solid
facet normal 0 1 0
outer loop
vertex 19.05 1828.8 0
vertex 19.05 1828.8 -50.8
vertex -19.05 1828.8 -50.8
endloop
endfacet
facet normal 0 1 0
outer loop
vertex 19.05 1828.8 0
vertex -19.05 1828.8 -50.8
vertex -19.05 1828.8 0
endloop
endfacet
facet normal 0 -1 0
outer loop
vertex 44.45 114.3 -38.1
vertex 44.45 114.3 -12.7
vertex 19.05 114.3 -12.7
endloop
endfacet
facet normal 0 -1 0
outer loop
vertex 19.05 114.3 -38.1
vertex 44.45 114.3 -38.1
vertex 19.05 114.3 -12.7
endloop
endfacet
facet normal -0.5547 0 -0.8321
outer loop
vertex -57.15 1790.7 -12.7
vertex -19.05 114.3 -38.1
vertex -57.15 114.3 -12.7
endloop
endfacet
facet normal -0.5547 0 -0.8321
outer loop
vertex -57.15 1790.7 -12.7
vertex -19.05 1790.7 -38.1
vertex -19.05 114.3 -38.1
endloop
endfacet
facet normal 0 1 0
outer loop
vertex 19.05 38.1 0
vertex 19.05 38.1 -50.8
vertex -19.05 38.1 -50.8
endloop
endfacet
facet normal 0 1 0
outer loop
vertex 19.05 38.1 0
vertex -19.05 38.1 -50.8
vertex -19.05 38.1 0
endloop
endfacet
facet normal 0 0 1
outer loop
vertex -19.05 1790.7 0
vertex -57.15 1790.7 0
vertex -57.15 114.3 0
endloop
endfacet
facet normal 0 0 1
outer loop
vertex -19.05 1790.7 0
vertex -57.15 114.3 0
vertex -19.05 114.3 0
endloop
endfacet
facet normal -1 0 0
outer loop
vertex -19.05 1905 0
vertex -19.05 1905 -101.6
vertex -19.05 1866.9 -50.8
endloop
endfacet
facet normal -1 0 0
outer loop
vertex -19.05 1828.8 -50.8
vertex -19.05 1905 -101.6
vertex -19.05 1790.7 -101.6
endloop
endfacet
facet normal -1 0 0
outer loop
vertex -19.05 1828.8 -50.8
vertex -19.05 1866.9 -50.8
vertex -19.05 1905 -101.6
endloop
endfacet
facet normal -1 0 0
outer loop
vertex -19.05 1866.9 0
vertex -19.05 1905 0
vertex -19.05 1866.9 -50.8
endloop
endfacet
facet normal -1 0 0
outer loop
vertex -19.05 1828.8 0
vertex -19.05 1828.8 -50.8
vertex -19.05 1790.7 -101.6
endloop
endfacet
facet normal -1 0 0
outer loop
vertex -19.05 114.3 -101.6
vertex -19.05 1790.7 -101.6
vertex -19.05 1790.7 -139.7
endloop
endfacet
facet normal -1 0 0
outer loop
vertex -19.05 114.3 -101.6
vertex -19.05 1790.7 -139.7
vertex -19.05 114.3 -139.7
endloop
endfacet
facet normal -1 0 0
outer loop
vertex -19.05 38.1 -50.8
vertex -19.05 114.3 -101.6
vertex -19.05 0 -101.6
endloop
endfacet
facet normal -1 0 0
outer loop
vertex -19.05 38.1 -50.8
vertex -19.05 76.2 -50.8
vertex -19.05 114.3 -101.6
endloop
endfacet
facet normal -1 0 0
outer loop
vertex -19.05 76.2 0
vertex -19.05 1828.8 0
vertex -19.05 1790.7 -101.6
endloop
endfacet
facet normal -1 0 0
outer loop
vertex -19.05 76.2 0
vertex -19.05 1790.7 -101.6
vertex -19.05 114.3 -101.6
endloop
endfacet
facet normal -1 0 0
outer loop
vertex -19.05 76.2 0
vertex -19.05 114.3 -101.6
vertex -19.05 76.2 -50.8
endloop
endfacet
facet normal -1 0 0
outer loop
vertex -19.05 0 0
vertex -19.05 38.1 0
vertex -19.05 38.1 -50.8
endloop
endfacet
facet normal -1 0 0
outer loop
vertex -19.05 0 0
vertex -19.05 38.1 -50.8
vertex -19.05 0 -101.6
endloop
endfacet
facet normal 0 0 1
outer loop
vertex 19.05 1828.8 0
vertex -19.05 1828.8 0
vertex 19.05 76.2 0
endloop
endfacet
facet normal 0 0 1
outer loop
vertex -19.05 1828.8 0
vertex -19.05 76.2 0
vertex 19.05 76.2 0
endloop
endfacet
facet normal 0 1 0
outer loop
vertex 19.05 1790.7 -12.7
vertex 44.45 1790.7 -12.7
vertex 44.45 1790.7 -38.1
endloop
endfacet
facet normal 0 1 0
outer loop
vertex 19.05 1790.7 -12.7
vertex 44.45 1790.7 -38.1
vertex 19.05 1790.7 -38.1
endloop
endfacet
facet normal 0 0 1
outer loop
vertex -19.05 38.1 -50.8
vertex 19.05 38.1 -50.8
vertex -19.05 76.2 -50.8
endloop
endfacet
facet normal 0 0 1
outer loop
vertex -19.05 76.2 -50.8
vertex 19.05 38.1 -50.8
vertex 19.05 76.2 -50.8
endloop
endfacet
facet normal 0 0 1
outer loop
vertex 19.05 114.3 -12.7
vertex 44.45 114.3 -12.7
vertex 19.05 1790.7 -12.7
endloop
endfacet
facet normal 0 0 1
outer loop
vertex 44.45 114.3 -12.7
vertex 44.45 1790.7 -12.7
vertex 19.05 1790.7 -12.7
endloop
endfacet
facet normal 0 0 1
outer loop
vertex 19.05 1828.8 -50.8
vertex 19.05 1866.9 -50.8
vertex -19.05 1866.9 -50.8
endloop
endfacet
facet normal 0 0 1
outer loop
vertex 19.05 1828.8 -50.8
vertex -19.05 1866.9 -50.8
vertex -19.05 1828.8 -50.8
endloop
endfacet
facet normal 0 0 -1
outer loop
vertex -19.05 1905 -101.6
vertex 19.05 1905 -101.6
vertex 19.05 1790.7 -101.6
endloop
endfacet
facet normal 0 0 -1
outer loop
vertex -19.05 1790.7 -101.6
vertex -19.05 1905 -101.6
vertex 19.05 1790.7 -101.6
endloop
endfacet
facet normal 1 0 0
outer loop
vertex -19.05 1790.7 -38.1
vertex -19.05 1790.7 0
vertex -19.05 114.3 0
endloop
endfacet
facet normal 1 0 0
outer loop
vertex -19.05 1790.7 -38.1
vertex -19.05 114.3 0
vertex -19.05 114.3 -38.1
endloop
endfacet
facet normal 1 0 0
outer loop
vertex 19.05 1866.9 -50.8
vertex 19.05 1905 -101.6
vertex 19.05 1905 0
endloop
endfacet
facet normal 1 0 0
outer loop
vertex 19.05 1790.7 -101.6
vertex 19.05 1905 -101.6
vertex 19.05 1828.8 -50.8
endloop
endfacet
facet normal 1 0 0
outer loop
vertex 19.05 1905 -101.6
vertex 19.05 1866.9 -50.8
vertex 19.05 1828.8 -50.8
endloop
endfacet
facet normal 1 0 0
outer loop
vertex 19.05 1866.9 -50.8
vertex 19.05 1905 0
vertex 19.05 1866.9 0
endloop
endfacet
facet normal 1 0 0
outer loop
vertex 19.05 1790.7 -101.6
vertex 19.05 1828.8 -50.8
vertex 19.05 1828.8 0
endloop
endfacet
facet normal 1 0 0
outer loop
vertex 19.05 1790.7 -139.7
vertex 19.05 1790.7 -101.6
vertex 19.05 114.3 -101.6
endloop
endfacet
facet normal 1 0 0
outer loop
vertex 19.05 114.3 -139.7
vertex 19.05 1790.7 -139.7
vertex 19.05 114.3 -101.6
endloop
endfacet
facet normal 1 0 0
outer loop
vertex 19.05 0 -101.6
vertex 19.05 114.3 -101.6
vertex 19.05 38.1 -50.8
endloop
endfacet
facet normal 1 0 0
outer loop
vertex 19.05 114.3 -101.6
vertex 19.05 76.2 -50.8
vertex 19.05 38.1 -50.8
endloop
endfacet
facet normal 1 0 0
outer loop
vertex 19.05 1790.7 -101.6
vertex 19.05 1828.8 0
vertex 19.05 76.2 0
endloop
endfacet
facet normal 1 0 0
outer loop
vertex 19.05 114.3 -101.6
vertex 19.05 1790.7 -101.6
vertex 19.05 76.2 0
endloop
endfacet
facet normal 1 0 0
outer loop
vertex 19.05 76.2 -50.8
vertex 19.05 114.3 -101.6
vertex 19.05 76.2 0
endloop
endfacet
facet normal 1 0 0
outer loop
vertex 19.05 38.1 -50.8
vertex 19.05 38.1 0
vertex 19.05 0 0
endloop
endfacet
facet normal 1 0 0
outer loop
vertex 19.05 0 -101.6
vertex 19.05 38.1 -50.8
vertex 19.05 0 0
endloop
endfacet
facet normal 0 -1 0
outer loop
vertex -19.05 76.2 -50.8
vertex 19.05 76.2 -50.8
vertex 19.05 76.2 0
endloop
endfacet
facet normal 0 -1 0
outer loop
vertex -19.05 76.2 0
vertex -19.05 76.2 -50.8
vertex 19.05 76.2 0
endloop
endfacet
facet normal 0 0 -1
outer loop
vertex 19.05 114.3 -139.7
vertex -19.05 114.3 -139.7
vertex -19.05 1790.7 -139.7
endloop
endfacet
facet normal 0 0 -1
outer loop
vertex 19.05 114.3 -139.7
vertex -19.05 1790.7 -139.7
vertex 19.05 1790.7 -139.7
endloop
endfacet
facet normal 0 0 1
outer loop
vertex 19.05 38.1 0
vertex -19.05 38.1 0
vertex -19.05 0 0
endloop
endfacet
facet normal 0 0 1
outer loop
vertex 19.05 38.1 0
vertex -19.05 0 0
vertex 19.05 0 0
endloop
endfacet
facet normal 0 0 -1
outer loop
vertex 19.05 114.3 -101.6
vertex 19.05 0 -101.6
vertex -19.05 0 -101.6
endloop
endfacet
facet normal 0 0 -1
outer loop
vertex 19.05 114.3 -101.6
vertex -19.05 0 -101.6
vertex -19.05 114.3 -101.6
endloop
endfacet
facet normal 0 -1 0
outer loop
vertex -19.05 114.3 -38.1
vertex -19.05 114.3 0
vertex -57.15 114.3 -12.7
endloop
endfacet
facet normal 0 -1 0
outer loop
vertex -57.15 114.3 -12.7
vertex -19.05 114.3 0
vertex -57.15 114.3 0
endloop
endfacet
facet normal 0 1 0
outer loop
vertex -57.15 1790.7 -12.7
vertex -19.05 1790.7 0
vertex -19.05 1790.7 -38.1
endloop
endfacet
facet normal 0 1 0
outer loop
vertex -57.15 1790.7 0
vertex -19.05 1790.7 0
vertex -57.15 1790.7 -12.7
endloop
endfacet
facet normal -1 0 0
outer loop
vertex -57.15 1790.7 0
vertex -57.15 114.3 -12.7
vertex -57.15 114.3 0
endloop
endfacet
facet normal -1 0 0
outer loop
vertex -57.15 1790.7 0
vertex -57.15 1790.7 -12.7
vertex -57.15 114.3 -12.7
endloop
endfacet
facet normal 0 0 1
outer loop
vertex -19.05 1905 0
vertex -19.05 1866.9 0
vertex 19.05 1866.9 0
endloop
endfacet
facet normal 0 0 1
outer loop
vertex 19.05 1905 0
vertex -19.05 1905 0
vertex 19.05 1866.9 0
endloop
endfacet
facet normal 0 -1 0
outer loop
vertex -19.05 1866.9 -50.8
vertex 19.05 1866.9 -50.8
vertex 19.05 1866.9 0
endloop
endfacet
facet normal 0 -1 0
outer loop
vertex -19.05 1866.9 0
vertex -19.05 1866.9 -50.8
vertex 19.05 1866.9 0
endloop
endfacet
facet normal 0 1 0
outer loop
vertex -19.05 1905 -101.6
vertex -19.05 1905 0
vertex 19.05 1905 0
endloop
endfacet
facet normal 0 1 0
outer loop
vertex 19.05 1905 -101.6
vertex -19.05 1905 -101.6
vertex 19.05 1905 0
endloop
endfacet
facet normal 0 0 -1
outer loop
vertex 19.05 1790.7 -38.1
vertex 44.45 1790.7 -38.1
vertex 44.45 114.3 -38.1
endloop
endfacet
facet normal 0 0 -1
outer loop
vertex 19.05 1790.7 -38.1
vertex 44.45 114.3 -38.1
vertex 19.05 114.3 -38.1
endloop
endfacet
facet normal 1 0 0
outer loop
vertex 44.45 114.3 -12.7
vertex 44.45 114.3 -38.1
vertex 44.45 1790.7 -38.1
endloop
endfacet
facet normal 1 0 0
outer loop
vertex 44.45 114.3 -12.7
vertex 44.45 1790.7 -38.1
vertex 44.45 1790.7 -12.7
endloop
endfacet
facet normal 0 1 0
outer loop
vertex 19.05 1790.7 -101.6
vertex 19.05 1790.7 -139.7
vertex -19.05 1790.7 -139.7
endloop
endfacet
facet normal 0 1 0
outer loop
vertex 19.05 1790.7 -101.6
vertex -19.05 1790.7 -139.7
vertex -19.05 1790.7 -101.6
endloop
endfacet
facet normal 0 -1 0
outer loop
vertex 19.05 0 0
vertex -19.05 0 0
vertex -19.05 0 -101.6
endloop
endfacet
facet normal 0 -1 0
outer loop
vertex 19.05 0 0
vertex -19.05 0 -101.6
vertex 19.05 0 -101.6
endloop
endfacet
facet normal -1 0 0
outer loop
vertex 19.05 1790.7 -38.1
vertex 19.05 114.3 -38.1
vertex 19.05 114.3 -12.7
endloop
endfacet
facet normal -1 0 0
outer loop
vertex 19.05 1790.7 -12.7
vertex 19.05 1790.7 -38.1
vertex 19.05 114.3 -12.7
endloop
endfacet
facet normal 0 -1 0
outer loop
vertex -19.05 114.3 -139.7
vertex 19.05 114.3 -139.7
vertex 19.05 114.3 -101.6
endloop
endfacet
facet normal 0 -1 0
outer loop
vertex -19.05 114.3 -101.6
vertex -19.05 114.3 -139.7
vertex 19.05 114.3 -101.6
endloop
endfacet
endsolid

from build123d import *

# Parameters (mm, degrees)
F0_W           = 38.1
F0_H           = 952.5
F1_DEPTH       = 139.7
F2_W           = 114.3
F2_H           = 38.1
F3_DEPTH       = 38.101
F4_W           = 38.1
F4_H           = 50.8
F5_DEPTH       = 38.101
F9_DEPTH       = 838.2
F9_DEPTH_BACK  = 838.2
F10_W          = 25.4
F10_H          = 25.4
F11_DEPTH      = 838.2
F11_DEPTH_BACK = 838.2


with BuildPart() as f1:
    # F0 (on Top) → F1 (new body)
    with BuildSketch(Plane.XY):
        with Locations((0, 476.25)):
            Rectangle(F0_W, F0_H)
    extrude(amount=-F1_DEPTH)

    # F2 (on face) → F3 (cut, through all)
    with BuildSketch(Plane.YZ.offset(19.05)):
        with Locations((57.15, -120.65)):
            Rectangle(F2_W, F2_H)
    extrude(amount=-F3_DEPTH, mode=Mode.SUBTRACT)

    # F4 (on face) → F5 (cut, through all)
    with BuildSketch(Plane.YZ.offset(19.05)):
        with Locations((57.15, -25.4)):
            Rectangle(F4_W, F4_H)
    extrude(amount=-F5_DEPTH, mode=Mode.SUBTRACT)

    # F7: F1 across plane


with BuildPart() as f1_1:
    add(f1.part)
    add(f1.part.mirror(Plane(origin=(0, 952.5, -69.85), x_dir=(-1, 0, 0), z_dir=(0, 1, 0))))


with BuildPart() as f9:
    # F8 (on offset) → F9 (new body, two sides)
    with BuildSketch(Plane(origin=(0, 952.5, 0), x_dir=(-1, 0, 0), z_dir=(0, 1, 0))) as f9_sk:
        Polygon((57.15, -12.7), (57.15, 0), (19.05, 0), (19.05, -38.1), align=None)
    extrude(amount=F9_DEPTH)
    extrude(f9_sk.sketch, amount=-F9_DEPTH_BACK)


with BuildPart() as f11:
    # F10 (on offset) → F11 (new body, two sides)
    with BuildSketch(Plane(origin=(0, 952.5, 0), x_dir=(-1, 0, 0), z_dir=(0, 1, 0))) as f11_sk:
        with Locations((-31.75, -25.4)):
            Rectangle(F10_W, F10_H)
    extrude(amount=F11_DEPTH)
    extrude(f11_sk.sketch, amount=-F11_DEPTH_BACK)


solid = Compound([f1_1.part, f9.part, f11.part])
